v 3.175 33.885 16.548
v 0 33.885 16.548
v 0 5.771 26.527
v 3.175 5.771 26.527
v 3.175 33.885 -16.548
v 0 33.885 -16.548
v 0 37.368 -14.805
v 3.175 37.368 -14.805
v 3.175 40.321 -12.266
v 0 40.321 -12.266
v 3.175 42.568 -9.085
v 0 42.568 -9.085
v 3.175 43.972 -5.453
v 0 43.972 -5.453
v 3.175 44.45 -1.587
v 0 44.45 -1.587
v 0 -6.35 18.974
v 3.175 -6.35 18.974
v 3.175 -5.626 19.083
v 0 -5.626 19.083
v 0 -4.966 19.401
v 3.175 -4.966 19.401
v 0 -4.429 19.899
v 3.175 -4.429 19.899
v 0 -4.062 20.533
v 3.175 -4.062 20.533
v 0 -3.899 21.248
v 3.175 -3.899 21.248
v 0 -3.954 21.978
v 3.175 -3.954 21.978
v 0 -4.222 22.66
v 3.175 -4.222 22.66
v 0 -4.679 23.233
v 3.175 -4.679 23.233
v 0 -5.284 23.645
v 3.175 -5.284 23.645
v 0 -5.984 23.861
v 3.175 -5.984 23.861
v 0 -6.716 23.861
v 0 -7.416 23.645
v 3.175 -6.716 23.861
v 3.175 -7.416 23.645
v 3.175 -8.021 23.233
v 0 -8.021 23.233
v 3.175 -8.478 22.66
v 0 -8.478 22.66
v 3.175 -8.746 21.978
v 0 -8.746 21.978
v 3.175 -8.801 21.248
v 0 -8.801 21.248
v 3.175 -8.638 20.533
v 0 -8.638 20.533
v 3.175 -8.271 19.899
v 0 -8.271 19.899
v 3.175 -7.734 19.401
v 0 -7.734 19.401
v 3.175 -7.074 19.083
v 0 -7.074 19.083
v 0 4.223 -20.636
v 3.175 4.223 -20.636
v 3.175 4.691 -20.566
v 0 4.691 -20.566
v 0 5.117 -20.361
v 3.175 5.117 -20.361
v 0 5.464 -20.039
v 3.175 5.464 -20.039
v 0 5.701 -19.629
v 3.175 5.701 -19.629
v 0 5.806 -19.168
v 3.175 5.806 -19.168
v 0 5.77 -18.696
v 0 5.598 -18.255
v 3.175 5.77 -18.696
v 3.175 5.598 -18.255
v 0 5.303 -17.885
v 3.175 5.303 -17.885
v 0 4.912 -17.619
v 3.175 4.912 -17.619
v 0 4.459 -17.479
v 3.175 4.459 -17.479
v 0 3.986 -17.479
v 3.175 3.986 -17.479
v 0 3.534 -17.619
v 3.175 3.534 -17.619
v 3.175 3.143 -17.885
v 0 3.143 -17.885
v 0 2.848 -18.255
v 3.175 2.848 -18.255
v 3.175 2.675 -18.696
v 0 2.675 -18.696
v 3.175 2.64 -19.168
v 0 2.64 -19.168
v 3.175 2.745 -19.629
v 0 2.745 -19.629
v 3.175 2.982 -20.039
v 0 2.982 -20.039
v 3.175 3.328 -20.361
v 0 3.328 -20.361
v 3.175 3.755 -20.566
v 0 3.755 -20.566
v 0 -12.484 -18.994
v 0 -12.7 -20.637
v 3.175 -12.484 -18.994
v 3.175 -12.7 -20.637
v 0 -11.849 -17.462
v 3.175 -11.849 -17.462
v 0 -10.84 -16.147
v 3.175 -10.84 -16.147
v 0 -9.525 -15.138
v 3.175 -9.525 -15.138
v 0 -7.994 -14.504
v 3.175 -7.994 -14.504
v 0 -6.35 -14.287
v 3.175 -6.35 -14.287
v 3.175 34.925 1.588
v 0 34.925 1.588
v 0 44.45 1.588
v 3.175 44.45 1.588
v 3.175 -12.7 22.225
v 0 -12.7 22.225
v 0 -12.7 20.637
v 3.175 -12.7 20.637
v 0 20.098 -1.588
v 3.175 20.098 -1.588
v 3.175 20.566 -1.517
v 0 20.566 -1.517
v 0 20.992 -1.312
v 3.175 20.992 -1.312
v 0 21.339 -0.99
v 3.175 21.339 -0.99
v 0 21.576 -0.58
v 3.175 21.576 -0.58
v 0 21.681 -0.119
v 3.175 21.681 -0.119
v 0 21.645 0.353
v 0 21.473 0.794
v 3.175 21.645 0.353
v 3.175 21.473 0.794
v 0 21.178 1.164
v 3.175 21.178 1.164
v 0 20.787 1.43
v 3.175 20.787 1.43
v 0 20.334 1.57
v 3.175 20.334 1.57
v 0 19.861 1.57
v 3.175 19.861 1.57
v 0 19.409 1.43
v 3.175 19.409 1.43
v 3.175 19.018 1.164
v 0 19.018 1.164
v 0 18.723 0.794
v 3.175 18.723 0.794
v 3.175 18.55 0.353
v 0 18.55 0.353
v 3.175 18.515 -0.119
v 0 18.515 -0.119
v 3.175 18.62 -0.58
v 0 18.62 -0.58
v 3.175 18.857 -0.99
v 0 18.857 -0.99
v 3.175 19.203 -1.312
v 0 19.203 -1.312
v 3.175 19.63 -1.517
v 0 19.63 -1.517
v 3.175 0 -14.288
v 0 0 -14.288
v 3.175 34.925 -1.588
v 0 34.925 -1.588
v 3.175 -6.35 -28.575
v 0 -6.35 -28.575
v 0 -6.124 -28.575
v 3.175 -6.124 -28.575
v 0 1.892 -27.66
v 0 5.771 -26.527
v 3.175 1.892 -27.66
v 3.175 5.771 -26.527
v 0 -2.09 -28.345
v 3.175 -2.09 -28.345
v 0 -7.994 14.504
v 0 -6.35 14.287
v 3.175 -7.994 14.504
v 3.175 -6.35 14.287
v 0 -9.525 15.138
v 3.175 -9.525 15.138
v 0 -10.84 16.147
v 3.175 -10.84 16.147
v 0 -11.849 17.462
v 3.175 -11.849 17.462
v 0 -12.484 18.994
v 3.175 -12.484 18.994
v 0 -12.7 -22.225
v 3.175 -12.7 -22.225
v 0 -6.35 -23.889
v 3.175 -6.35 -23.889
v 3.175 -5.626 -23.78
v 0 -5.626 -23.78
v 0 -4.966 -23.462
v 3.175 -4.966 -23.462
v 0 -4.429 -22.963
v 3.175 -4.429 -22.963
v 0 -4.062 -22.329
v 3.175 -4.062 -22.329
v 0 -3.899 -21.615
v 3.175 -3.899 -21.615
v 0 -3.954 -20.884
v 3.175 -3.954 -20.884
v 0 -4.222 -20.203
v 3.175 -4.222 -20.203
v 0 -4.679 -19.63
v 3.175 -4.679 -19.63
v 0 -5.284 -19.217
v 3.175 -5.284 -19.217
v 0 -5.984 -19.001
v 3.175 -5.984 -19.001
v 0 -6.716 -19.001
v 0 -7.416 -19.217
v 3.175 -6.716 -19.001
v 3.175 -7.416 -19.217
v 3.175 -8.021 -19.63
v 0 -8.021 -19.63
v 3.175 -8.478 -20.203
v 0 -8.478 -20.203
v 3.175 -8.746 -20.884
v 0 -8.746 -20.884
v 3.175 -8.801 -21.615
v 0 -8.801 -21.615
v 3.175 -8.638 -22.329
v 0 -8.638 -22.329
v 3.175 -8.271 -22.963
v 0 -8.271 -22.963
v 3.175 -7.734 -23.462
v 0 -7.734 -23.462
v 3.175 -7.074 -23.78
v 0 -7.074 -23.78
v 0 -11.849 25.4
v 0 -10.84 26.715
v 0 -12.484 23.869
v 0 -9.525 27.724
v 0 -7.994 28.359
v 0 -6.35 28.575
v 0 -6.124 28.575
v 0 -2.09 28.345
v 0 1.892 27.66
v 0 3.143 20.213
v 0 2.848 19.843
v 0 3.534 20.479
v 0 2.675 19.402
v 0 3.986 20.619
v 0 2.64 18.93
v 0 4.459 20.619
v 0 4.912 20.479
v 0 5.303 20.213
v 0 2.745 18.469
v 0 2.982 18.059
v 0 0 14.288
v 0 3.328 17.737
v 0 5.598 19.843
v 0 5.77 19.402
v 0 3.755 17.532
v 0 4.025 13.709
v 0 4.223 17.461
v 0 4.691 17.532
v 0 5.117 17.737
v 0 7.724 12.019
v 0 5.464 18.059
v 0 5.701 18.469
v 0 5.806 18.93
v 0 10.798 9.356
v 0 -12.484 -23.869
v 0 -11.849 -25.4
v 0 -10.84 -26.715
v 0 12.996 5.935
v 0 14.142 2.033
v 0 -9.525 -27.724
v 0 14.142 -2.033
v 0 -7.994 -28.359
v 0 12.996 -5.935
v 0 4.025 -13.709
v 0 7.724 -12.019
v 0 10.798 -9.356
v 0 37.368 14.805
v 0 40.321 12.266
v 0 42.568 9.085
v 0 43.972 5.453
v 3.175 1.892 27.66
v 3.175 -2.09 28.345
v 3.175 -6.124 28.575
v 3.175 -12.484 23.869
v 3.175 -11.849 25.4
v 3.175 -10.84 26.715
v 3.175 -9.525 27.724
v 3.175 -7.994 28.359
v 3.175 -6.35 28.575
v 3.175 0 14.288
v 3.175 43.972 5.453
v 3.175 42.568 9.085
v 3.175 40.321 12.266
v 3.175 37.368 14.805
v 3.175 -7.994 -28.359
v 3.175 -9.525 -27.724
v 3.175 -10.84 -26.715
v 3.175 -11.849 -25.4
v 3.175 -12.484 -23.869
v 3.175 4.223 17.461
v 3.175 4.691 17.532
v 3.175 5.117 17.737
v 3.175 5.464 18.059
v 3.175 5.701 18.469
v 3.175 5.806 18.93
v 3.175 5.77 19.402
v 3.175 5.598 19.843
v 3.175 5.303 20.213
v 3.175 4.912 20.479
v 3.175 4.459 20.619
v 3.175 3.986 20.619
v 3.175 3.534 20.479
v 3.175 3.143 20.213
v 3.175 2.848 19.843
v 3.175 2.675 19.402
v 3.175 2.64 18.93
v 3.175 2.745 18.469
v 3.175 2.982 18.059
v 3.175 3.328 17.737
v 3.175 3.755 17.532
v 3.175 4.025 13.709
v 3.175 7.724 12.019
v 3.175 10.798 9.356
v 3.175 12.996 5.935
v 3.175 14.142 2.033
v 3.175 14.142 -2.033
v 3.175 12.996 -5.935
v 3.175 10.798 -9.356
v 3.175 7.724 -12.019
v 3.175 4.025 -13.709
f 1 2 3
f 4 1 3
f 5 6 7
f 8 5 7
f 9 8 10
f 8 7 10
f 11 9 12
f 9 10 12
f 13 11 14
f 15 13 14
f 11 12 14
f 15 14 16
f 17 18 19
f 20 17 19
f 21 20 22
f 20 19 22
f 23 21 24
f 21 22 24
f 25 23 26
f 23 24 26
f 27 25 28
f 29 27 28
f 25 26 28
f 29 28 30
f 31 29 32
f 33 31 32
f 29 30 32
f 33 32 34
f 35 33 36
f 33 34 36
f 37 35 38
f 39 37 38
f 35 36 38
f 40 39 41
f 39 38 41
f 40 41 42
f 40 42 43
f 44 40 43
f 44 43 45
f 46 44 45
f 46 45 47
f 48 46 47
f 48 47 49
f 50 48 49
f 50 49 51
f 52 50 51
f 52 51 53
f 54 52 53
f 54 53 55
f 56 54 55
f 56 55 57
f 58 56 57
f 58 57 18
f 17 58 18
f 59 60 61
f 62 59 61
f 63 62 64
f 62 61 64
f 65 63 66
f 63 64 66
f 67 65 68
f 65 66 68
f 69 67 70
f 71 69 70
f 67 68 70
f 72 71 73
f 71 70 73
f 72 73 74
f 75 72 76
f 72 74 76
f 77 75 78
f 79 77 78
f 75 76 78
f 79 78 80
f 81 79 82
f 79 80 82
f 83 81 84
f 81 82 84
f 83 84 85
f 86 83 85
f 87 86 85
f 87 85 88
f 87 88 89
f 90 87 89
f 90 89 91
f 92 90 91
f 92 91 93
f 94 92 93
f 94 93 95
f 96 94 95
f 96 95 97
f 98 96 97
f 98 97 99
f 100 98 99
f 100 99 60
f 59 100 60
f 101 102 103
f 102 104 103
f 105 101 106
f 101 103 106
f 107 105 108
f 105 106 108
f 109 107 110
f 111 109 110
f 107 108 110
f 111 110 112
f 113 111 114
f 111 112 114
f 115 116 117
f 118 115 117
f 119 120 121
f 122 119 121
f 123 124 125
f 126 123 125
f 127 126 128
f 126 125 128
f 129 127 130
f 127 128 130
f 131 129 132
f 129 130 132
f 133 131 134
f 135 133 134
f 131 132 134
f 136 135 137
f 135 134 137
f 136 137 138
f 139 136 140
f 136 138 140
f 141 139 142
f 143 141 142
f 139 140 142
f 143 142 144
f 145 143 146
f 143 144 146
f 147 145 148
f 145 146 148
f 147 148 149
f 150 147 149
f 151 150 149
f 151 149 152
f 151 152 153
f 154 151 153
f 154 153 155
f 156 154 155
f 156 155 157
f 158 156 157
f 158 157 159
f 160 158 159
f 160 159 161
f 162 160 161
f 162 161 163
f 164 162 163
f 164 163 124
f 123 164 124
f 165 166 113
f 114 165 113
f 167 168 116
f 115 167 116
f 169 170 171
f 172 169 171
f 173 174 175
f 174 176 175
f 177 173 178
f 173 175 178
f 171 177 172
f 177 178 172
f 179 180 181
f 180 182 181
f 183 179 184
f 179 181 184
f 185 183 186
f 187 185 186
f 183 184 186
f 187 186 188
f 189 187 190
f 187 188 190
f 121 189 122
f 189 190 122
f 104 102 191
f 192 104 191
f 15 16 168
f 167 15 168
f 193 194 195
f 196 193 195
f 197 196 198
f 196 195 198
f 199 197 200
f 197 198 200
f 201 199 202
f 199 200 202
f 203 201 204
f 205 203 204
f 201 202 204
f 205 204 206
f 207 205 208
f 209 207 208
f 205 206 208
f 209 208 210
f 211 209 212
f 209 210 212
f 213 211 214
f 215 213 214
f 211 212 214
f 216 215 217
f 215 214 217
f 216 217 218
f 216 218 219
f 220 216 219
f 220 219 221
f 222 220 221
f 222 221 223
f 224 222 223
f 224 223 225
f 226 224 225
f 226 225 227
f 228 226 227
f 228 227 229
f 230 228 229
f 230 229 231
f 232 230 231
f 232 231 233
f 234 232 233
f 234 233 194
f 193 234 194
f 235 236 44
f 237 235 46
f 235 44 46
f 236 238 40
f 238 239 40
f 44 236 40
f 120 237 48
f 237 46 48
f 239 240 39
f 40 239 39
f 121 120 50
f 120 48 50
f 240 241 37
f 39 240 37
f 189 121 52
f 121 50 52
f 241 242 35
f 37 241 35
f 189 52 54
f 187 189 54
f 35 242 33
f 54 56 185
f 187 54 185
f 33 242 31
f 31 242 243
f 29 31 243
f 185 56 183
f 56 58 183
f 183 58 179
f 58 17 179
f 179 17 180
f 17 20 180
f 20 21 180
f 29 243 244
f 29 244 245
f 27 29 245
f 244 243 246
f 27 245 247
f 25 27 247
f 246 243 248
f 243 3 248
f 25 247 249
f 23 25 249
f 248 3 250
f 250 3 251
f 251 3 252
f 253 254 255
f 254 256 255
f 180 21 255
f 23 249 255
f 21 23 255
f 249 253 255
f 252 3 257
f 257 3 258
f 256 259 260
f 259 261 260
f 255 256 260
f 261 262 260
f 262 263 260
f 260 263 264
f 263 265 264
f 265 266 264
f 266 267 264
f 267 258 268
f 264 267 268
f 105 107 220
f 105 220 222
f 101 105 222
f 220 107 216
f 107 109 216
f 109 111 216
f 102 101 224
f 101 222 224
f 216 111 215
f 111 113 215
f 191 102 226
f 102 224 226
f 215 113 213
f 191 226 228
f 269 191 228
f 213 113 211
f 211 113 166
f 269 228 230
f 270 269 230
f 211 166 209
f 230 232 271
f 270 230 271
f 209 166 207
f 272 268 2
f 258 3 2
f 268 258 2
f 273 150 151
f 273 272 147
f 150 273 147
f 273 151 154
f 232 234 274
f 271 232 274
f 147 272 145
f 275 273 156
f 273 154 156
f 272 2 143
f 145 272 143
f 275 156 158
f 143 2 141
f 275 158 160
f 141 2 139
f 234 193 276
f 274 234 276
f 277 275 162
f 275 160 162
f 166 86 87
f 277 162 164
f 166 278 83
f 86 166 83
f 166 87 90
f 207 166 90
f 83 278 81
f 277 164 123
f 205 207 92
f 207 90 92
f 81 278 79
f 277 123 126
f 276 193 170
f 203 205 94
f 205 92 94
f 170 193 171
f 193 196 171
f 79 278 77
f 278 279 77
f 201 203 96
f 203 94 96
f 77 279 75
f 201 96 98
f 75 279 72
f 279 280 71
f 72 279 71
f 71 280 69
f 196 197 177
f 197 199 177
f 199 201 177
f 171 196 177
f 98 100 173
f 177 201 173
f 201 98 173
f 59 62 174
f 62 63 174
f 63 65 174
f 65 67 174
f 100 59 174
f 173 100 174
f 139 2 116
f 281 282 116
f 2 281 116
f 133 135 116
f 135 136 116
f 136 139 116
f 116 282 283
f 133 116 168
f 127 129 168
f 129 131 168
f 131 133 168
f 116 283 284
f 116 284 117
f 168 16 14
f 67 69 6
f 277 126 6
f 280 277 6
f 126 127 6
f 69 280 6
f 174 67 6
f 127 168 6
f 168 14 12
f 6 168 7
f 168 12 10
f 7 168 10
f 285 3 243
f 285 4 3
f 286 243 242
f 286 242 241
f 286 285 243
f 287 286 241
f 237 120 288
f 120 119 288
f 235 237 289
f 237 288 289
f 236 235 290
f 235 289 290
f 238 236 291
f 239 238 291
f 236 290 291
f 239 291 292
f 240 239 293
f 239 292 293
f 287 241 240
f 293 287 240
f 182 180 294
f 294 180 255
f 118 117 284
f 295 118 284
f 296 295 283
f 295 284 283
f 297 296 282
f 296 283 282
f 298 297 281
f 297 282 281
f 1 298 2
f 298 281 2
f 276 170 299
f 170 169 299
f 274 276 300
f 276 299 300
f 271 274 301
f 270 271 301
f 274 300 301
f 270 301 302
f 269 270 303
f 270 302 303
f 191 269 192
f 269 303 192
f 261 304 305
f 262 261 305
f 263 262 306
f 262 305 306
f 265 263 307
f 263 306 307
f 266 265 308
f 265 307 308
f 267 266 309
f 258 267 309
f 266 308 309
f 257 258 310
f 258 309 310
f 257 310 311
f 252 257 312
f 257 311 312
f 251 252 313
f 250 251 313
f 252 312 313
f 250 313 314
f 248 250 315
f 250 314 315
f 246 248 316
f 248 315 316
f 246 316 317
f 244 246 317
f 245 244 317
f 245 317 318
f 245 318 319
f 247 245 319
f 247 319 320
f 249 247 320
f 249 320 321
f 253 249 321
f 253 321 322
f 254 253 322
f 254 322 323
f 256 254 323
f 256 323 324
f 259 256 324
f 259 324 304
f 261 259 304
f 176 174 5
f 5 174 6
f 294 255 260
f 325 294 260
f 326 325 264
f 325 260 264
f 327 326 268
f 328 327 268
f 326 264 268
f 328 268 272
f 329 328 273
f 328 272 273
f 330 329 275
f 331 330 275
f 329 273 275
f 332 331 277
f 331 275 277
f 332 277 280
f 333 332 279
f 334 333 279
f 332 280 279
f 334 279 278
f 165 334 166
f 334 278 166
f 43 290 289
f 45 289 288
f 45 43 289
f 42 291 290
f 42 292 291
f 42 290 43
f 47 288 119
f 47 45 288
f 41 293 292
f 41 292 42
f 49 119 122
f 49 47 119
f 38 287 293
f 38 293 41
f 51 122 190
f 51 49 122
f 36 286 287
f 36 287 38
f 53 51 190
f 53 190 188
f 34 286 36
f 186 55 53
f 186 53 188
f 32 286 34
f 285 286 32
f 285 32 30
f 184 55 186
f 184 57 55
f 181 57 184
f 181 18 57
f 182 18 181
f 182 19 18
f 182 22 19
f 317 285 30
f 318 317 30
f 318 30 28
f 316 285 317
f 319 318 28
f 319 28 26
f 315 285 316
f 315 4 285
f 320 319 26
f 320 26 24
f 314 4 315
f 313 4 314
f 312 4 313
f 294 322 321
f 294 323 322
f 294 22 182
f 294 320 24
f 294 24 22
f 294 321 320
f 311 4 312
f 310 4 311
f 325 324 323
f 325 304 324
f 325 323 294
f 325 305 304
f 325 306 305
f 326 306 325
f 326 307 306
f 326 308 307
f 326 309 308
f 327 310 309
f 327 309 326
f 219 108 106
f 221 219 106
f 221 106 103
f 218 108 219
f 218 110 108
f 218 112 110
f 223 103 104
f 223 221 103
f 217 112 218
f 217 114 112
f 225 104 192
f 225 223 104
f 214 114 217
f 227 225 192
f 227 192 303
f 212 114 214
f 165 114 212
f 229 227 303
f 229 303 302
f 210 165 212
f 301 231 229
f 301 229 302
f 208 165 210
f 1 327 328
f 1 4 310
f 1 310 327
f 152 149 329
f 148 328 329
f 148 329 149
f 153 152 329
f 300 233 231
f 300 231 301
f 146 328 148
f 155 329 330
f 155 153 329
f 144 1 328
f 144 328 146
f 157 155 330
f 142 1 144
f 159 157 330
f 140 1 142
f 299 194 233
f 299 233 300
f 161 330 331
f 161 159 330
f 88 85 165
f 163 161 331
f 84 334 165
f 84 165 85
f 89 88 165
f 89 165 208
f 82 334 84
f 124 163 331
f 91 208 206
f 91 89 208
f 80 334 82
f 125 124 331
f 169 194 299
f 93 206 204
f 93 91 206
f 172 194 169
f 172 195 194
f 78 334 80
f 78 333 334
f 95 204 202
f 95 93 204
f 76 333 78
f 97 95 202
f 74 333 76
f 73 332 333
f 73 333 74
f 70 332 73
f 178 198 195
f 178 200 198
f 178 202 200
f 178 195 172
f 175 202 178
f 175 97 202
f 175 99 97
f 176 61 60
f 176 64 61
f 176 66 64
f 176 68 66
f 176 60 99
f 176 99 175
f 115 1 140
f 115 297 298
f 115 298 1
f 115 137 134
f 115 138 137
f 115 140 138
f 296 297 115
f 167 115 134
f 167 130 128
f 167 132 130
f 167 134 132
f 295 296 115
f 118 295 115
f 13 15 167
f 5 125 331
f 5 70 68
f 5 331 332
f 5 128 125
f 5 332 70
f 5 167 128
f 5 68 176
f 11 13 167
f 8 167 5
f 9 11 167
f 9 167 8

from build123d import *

# Parameters (mm, degrees)
BOSS_EXTRUDE1_DEPTH              = 3.175
F_10_0_1935_DIAMETER_HOLE1_D     = 4.9149
F_10_0_1935_DIAMETER_HOLE1_DEPTH = 19.001994
F_10_0_1935_DIAMETER_HOLE1_TIP   = 1.476584928
SKETCH4_R                        = 1.5875
CUT_EXTRUDE1_DEPTH               = 53.937829102
FILLET2_R                        = 35.56
FILLET1_R                        = 6.35


with BuildPart() as part:
    # Sketch1 → Boss-Extrude1 (new body)
    with BuildSketch(Plane(origin=(0, 0, 0), x_dir=(0, 0, -1), z_dir=(1, 0, 0))):
        with BuildLine():
            Line((1.5875, 44.45), (1.5875, 34.925))
            Line((1.5875, 34.925), (-1.5875, 34.925))
            Line((-1.5875, 34.925), (-1.5875, 44.45))
            ThreePointArc((-1.5875, 44.45), (-10.74499019, 41.54249777), (-16.548096362, 33.885007675))
            Line((-16.548096362, 33.885007675), (-28.575, 0))
            Line((-28.575, 0), (-28.575, -12.7))
            Line((-28.575, -12.7), (-14.2875, -12.7))
            Line((-14.2875, -12.7), (-14.2875, 0))
            ThreePointArc((-14.2875, 0), (0, 14.2875), (14.2875, 0))
            Line((14.2875, 0), (14.2875, -12.7))
            Line((14.2875, -12.7), (28.575, -12.7))
            Line((28.575, -12.7), (28.575, 0))
            Line((28.575, 0), (16.548096362, 33.885007675))
            ThreePointArc((16.548096362, 33.885007675), (10.74499019, 41.54249777), (1.5875, 44.45))
        make_face()
    extrude(amount=BOSS_EXTRUDE1_DEPTH)

    # #10 (0.1935) Diameter Hole1
    with Locations(Plane.ZY):
        with Locations((-21.43125, -6.35), (21.43125, -6.35)):
            Hole(F_10_0_1935_DIAMETER_HOLE1_D / 2, depth=F_10_0_1935_DIAMETER_HOLE1_DEPTH)
            with Locations((0, 0, -(F_10_0_1935_DIAMETER_HOLE1_DEPTH + F_10_0_1935_DIAMETER_HOLE1_TIP / 2))):  # 118° drill point
                Cone(0, F_10_0_1935_DIAMETER_HOLE1_D / 2, F_10_0_1935_DIAMETER_HOLE1_TIP, mode=Mode.SUBTRACT)

    # Sketch4 → Cut-Extrude1 (cut, through all)
    with BuildSketch(Plane(origin=(3.175, 0, 0), x_dir=(0, 0, -1), z_dir=(1, 0, 0))):
        with Locations((0, 20.09775)):
            Circle(SKETCH4_R)
        with Locations((-19.048871022, 4.22275)):
            Circle(SKETCH4_R)
        with Locations((19.048871022, 4.22275)):
            Circle(SKETCH4_R)
    extrude(amount=-CUT_EXTRUDE1_DEPTH, mode=Mode.SUBTRACT)

    # Fillet2
    fillet2_edges = [part.edges().sort_by_distance(p)[0] for p in [
        (1.5875, 0, 28.575),
        (1.5875, 0, -28.575),
    ]]
    fillet(fillet2_edges, radius=FILLET2_R)

    # Fillet1
    fillet1_edges = [part.edges().sort_by_distance(p)[0] for p in [
        (1.5875, -12.7, 14.2875),
        (1.5875, -12.7, 28.575),
        (1.5875, -12.7, -28.575),
        (1.5875, -12.7, -14.2875),
    ]]
    fillet(fillet1_edges, radius=FILLET1_R)


solid = part.part
